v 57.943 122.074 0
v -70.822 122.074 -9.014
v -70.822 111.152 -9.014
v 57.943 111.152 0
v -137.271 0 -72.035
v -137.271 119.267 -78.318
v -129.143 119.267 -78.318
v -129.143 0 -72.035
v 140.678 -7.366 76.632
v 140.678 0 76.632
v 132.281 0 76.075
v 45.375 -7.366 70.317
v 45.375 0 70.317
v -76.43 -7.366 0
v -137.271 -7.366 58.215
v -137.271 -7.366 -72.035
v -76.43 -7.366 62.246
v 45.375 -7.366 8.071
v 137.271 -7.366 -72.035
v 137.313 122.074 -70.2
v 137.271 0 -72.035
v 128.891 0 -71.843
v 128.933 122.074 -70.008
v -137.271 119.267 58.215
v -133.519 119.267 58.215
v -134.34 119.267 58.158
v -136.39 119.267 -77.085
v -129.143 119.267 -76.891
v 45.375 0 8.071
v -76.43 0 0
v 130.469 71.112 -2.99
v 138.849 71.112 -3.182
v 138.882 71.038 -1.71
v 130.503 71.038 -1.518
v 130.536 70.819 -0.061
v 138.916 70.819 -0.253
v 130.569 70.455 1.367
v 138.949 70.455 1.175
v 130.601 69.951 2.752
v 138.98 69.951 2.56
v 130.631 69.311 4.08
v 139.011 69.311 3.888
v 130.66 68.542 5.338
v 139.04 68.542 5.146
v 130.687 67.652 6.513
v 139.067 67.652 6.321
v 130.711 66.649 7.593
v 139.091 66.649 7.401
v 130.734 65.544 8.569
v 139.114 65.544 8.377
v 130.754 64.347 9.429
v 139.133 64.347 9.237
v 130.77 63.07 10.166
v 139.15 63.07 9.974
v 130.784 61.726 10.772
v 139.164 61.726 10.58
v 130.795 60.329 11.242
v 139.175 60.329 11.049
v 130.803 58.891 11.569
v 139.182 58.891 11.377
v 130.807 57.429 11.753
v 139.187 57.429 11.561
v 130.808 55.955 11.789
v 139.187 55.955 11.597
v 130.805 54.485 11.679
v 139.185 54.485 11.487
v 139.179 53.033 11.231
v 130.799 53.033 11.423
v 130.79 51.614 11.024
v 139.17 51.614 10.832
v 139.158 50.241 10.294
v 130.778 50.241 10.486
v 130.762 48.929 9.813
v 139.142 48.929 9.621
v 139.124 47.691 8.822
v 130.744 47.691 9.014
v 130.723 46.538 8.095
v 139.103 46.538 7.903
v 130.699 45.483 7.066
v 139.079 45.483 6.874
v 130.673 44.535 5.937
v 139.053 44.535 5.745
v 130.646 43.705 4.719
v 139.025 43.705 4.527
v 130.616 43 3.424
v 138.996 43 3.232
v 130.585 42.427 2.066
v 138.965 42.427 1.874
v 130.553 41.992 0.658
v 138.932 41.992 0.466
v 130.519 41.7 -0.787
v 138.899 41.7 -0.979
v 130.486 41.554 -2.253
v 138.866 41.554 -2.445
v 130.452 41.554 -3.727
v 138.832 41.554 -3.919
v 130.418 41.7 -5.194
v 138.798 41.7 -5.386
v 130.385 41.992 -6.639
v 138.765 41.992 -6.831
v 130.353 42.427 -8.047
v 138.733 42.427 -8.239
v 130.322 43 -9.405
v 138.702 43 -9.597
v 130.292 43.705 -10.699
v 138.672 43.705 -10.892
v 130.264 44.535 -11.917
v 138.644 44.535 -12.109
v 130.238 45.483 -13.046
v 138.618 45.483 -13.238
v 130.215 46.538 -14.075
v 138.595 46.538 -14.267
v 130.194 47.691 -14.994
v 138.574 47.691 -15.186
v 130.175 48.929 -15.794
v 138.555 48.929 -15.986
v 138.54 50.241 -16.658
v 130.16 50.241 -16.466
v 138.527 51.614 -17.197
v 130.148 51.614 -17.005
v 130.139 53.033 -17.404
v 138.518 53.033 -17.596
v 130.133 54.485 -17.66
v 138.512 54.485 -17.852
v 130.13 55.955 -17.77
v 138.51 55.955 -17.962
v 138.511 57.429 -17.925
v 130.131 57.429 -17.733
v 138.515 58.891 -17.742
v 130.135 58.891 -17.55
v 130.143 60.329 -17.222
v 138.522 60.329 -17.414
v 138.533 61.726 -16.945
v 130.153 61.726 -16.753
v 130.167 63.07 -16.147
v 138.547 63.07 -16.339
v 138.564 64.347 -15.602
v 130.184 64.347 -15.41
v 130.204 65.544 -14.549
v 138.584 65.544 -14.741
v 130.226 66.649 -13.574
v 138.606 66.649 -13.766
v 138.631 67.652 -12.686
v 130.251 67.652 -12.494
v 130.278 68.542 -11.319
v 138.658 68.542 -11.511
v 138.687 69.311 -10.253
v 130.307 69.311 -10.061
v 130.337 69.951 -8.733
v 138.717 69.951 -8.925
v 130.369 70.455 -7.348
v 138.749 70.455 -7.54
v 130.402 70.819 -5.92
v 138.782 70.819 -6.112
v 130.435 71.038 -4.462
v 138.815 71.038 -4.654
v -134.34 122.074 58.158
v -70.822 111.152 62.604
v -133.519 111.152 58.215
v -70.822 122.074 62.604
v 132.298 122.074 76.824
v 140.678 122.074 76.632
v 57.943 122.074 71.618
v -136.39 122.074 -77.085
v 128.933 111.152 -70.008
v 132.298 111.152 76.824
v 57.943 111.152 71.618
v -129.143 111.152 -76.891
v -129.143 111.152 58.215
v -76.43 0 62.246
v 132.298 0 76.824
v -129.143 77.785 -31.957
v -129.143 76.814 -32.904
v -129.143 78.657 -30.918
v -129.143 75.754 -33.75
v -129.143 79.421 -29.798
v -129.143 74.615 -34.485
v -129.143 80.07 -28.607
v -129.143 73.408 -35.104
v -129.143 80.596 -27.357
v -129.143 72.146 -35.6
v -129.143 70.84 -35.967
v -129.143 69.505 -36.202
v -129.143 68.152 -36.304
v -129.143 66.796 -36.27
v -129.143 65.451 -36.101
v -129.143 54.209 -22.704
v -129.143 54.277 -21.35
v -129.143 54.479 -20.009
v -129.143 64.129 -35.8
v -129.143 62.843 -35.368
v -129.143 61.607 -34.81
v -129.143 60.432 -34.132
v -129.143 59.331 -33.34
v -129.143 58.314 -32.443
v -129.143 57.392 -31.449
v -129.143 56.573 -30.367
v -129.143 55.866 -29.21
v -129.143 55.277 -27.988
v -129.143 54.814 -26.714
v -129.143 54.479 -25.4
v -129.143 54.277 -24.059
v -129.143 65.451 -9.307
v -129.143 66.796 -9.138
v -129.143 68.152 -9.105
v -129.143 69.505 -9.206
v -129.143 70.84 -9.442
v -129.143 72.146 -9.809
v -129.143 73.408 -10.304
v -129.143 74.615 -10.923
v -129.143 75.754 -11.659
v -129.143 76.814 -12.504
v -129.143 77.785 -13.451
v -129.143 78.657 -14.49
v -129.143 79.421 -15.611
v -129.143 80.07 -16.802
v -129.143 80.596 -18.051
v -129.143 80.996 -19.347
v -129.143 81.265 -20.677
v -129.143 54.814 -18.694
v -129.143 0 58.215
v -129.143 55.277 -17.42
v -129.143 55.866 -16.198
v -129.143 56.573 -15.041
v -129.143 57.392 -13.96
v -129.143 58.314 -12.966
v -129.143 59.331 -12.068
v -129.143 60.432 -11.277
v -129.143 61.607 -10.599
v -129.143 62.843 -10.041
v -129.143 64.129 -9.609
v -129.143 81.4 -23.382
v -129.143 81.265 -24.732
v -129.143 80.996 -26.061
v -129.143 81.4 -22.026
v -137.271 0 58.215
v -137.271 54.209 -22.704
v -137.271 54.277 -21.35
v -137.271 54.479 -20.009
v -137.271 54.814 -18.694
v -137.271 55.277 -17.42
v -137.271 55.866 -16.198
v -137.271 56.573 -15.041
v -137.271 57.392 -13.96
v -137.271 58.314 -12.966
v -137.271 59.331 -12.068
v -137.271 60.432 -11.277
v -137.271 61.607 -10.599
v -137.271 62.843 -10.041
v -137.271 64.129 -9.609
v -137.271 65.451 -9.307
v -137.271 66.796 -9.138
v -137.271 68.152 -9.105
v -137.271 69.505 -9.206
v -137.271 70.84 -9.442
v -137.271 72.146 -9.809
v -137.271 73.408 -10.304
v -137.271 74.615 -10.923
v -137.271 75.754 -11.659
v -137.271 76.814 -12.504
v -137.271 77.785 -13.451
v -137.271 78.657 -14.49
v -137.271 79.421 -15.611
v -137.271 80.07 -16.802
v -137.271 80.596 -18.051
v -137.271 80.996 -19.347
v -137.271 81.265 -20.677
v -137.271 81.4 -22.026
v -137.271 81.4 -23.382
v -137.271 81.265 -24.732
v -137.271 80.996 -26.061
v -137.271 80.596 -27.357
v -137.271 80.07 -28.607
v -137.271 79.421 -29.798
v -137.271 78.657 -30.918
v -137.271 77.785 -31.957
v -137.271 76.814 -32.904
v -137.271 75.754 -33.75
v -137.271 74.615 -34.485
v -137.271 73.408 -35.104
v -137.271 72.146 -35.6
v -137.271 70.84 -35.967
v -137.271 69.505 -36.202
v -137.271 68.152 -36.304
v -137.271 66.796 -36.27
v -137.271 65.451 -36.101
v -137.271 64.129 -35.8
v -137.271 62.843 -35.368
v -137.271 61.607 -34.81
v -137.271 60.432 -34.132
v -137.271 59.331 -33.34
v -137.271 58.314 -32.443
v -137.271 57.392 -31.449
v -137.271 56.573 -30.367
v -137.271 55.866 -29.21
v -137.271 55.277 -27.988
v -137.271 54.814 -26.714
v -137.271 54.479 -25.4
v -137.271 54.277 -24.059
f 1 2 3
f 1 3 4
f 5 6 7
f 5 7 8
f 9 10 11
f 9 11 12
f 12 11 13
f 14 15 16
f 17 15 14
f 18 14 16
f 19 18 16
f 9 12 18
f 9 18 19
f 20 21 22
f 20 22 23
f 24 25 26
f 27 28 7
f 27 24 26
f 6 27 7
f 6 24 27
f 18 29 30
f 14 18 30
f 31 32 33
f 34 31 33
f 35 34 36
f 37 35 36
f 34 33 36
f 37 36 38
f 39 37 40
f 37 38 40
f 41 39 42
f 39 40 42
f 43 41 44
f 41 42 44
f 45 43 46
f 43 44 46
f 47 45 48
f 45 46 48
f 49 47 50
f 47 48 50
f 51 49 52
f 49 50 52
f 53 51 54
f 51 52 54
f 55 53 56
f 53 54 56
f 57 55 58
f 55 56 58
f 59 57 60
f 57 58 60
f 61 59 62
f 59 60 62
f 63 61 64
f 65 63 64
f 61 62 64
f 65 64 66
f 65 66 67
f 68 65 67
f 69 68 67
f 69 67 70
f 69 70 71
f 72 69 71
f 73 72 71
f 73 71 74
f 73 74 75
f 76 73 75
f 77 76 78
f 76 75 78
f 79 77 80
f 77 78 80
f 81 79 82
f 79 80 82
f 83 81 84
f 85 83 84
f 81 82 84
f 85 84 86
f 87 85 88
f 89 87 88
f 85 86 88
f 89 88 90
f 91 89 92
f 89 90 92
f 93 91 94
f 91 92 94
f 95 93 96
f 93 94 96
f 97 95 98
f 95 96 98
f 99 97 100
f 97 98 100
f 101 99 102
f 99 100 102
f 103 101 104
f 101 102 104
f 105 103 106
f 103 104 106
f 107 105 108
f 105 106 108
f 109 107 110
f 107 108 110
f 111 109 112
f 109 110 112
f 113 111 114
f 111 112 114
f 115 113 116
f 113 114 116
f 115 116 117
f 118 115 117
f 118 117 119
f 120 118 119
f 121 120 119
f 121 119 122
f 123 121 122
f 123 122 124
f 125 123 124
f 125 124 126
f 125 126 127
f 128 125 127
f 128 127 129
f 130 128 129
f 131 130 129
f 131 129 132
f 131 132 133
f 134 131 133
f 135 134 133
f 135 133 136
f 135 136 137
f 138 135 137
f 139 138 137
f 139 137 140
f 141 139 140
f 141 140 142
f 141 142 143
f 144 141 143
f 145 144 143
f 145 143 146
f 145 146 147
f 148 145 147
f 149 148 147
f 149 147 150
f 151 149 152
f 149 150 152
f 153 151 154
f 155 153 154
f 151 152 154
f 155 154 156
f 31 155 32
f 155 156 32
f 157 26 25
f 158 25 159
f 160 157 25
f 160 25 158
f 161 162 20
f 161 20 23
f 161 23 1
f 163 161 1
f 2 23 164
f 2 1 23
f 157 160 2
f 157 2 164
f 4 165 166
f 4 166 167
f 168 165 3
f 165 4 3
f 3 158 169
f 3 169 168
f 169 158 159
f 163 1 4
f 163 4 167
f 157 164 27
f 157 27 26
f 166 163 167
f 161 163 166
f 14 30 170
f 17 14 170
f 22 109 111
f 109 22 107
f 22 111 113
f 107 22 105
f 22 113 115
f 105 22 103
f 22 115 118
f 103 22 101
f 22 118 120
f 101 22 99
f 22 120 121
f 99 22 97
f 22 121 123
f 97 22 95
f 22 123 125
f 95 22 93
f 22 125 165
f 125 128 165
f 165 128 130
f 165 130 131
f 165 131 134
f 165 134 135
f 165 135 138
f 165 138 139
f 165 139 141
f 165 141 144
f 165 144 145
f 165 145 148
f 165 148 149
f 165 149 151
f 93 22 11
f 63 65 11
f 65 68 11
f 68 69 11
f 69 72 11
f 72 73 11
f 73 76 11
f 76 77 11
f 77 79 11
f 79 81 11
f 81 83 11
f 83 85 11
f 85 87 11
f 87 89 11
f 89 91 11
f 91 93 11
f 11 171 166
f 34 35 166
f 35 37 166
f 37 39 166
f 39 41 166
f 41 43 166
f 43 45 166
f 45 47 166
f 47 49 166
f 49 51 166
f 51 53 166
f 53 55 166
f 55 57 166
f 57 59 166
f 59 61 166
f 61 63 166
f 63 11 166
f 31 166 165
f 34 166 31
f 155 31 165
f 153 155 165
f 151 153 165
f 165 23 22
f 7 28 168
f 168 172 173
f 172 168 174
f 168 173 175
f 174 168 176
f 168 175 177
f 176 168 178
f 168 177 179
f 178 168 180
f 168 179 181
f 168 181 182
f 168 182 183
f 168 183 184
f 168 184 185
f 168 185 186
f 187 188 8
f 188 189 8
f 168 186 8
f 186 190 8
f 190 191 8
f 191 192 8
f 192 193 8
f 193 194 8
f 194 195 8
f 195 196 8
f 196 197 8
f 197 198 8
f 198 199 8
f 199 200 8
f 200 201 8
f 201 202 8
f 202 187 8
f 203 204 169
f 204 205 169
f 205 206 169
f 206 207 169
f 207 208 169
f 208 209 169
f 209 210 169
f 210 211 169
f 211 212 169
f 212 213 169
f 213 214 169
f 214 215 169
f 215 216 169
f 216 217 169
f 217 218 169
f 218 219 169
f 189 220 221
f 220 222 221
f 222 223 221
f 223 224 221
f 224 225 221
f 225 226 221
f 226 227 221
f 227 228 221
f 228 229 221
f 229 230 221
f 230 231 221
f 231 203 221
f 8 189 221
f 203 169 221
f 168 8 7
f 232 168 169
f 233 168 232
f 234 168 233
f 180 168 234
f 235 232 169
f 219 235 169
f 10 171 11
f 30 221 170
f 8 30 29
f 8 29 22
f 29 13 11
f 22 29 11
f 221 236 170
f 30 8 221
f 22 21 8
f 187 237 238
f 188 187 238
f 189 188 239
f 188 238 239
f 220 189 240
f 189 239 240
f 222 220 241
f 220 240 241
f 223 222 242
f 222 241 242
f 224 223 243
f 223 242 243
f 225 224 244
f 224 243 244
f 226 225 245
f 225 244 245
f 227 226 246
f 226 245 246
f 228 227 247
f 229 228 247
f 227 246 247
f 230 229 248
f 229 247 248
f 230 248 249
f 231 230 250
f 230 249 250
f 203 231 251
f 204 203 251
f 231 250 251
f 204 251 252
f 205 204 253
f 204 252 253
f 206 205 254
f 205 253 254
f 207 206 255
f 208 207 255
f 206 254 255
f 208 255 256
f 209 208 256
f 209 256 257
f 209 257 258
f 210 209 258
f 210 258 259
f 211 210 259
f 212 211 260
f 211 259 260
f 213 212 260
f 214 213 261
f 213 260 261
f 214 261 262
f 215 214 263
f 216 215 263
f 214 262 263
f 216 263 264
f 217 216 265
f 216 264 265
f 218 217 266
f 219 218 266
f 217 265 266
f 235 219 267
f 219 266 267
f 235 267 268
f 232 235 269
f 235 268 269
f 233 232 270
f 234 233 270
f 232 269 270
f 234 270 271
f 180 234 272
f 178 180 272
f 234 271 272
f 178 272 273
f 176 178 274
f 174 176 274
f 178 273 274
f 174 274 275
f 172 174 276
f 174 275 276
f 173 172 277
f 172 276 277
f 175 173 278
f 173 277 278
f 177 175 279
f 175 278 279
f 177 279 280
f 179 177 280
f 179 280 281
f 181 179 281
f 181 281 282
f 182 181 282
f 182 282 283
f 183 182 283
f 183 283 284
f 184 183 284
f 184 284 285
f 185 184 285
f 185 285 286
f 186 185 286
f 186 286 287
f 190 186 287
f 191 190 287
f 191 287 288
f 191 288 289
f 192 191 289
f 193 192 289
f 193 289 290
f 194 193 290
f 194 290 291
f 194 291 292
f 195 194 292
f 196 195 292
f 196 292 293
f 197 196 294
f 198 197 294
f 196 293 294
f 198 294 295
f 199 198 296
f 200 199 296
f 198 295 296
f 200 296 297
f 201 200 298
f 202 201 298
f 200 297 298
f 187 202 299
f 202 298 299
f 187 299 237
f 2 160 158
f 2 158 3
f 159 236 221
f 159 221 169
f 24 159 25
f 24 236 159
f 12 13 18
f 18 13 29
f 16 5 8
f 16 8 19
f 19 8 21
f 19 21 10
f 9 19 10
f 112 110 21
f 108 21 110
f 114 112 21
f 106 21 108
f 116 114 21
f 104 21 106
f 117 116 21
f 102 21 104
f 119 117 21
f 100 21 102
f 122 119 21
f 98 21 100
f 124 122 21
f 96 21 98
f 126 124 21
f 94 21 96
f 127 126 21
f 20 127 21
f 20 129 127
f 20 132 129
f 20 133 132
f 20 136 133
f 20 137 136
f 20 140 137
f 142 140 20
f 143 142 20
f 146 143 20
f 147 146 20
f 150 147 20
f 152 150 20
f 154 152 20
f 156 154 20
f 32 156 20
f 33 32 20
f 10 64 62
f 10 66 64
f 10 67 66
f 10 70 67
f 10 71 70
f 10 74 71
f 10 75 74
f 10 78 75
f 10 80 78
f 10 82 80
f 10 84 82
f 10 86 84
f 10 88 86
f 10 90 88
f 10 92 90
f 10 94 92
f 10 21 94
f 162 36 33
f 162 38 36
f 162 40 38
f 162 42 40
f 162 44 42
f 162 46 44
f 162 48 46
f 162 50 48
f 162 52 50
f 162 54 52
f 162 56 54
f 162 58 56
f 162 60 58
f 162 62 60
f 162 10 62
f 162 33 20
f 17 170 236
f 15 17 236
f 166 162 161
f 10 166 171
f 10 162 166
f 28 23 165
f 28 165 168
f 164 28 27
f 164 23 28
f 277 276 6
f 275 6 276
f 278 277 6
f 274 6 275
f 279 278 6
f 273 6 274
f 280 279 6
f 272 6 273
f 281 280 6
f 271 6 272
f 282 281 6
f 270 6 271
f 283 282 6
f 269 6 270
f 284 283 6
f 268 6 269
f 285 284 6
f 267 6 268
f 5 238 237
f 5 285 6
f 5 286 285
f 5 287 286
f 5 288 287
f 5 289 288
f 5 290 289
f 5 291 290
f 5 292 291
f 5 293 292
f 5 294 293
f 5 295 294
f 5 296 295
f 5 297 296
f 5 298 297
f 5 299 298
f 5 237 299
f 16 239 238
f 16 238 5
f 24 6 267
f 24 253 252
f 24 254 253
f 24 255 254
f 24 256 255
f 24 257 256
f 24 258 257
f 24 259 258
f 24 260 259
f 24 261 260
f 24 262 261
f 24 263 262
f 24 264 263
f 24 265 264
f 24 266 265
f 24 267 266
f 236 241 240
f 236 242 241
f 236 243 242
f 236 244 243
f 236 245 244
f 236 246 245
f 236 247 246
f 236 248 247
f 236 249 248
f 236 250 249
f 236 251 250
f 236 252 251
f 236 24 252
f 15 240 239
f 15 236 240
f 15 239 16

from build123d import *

# Parameters (mm, degrees)
F1_DEPTH = 7.366
F2_R     = 14.7883109898
F4_DEPTH = 8.382
F3_R     = 13.603757009
F5_DEPTH = 8.128
F7_DEPTH = 10.922


with BuildPart() as f1:
    # F0 (on Front) → F1 (new body)
    with BuildSketch(Plane.XZ):
        Polygon((-76.4300598123, 62.2463936663), (-137.2705996037, 58.215200901), (-137.2705996037, -72.0348134637), (137.2705996037, -72.0348134637), (140.6780183315, 76.6316130757), (45.3754555261, 70.3170241025), (45.3754555261, 8.0706304363), (-76.4300598123, 0), align=None)
    extrude(amount=F1_DEPTH)

    # F2 (on face) → F4 (join)
    with BuildSketch(Plane(origin=(138.8486896806, 0, -3.1823972404), x_dir=(0, 1, 0), z_dir=(0.9997374427, 0, -0.0229138761))):
        Polygon((122.0736131072, 79.834971573), (0, 79.834971573), (0, -68.8704986774), (122.0736131072, -67.0348182321), align=None)
        with Locations((56.3235022128, 0)):
            Circle(F2_R, mode=Mode.SUBTRACT)
    extrude(amount=-F4_DEPTH)

    # F3 (on face) → F5 (join)
    with BuildSketch(Plane(origin=(-137.2705996037, 0, 0), x_dir=(0, -1, 0), z_dir=(-1, 0, 0))):
        Polygon((0, -72.0348134637), (0, 58.215200901), (-119.2674264312, 58.215200901), (-119.2674264312, -78.3181233552), align=None)
        with Locations((-67.8130164742, -22.7041952312)):
            Circle(F3_R, mode=Mode.SUBTRACT)
    extrude(amount=-F5_DEPTH)

    # F6 (on face) → F7 (join)
    with BuildSketch(Plane(origin=(0, 122.0736131072, 0), x_dir=(-1, 0, 0), z_dir=(0, 1, 0))):
        Polygon((-132.2982190871, 76.8236771856), (-128.9328629136, -70.0075508798), (136.390298605, -77.0845785737), (134.340301156, 58.1577047706), (70.8223407273, 62.6042659656), (70.8223407273, -9.0142149687), (-57.9433558552, 0), (-57.9433558552, 71.6184809343), align=None)
    extrude(amount=-F7_DEPTH)


solid = f1.part
